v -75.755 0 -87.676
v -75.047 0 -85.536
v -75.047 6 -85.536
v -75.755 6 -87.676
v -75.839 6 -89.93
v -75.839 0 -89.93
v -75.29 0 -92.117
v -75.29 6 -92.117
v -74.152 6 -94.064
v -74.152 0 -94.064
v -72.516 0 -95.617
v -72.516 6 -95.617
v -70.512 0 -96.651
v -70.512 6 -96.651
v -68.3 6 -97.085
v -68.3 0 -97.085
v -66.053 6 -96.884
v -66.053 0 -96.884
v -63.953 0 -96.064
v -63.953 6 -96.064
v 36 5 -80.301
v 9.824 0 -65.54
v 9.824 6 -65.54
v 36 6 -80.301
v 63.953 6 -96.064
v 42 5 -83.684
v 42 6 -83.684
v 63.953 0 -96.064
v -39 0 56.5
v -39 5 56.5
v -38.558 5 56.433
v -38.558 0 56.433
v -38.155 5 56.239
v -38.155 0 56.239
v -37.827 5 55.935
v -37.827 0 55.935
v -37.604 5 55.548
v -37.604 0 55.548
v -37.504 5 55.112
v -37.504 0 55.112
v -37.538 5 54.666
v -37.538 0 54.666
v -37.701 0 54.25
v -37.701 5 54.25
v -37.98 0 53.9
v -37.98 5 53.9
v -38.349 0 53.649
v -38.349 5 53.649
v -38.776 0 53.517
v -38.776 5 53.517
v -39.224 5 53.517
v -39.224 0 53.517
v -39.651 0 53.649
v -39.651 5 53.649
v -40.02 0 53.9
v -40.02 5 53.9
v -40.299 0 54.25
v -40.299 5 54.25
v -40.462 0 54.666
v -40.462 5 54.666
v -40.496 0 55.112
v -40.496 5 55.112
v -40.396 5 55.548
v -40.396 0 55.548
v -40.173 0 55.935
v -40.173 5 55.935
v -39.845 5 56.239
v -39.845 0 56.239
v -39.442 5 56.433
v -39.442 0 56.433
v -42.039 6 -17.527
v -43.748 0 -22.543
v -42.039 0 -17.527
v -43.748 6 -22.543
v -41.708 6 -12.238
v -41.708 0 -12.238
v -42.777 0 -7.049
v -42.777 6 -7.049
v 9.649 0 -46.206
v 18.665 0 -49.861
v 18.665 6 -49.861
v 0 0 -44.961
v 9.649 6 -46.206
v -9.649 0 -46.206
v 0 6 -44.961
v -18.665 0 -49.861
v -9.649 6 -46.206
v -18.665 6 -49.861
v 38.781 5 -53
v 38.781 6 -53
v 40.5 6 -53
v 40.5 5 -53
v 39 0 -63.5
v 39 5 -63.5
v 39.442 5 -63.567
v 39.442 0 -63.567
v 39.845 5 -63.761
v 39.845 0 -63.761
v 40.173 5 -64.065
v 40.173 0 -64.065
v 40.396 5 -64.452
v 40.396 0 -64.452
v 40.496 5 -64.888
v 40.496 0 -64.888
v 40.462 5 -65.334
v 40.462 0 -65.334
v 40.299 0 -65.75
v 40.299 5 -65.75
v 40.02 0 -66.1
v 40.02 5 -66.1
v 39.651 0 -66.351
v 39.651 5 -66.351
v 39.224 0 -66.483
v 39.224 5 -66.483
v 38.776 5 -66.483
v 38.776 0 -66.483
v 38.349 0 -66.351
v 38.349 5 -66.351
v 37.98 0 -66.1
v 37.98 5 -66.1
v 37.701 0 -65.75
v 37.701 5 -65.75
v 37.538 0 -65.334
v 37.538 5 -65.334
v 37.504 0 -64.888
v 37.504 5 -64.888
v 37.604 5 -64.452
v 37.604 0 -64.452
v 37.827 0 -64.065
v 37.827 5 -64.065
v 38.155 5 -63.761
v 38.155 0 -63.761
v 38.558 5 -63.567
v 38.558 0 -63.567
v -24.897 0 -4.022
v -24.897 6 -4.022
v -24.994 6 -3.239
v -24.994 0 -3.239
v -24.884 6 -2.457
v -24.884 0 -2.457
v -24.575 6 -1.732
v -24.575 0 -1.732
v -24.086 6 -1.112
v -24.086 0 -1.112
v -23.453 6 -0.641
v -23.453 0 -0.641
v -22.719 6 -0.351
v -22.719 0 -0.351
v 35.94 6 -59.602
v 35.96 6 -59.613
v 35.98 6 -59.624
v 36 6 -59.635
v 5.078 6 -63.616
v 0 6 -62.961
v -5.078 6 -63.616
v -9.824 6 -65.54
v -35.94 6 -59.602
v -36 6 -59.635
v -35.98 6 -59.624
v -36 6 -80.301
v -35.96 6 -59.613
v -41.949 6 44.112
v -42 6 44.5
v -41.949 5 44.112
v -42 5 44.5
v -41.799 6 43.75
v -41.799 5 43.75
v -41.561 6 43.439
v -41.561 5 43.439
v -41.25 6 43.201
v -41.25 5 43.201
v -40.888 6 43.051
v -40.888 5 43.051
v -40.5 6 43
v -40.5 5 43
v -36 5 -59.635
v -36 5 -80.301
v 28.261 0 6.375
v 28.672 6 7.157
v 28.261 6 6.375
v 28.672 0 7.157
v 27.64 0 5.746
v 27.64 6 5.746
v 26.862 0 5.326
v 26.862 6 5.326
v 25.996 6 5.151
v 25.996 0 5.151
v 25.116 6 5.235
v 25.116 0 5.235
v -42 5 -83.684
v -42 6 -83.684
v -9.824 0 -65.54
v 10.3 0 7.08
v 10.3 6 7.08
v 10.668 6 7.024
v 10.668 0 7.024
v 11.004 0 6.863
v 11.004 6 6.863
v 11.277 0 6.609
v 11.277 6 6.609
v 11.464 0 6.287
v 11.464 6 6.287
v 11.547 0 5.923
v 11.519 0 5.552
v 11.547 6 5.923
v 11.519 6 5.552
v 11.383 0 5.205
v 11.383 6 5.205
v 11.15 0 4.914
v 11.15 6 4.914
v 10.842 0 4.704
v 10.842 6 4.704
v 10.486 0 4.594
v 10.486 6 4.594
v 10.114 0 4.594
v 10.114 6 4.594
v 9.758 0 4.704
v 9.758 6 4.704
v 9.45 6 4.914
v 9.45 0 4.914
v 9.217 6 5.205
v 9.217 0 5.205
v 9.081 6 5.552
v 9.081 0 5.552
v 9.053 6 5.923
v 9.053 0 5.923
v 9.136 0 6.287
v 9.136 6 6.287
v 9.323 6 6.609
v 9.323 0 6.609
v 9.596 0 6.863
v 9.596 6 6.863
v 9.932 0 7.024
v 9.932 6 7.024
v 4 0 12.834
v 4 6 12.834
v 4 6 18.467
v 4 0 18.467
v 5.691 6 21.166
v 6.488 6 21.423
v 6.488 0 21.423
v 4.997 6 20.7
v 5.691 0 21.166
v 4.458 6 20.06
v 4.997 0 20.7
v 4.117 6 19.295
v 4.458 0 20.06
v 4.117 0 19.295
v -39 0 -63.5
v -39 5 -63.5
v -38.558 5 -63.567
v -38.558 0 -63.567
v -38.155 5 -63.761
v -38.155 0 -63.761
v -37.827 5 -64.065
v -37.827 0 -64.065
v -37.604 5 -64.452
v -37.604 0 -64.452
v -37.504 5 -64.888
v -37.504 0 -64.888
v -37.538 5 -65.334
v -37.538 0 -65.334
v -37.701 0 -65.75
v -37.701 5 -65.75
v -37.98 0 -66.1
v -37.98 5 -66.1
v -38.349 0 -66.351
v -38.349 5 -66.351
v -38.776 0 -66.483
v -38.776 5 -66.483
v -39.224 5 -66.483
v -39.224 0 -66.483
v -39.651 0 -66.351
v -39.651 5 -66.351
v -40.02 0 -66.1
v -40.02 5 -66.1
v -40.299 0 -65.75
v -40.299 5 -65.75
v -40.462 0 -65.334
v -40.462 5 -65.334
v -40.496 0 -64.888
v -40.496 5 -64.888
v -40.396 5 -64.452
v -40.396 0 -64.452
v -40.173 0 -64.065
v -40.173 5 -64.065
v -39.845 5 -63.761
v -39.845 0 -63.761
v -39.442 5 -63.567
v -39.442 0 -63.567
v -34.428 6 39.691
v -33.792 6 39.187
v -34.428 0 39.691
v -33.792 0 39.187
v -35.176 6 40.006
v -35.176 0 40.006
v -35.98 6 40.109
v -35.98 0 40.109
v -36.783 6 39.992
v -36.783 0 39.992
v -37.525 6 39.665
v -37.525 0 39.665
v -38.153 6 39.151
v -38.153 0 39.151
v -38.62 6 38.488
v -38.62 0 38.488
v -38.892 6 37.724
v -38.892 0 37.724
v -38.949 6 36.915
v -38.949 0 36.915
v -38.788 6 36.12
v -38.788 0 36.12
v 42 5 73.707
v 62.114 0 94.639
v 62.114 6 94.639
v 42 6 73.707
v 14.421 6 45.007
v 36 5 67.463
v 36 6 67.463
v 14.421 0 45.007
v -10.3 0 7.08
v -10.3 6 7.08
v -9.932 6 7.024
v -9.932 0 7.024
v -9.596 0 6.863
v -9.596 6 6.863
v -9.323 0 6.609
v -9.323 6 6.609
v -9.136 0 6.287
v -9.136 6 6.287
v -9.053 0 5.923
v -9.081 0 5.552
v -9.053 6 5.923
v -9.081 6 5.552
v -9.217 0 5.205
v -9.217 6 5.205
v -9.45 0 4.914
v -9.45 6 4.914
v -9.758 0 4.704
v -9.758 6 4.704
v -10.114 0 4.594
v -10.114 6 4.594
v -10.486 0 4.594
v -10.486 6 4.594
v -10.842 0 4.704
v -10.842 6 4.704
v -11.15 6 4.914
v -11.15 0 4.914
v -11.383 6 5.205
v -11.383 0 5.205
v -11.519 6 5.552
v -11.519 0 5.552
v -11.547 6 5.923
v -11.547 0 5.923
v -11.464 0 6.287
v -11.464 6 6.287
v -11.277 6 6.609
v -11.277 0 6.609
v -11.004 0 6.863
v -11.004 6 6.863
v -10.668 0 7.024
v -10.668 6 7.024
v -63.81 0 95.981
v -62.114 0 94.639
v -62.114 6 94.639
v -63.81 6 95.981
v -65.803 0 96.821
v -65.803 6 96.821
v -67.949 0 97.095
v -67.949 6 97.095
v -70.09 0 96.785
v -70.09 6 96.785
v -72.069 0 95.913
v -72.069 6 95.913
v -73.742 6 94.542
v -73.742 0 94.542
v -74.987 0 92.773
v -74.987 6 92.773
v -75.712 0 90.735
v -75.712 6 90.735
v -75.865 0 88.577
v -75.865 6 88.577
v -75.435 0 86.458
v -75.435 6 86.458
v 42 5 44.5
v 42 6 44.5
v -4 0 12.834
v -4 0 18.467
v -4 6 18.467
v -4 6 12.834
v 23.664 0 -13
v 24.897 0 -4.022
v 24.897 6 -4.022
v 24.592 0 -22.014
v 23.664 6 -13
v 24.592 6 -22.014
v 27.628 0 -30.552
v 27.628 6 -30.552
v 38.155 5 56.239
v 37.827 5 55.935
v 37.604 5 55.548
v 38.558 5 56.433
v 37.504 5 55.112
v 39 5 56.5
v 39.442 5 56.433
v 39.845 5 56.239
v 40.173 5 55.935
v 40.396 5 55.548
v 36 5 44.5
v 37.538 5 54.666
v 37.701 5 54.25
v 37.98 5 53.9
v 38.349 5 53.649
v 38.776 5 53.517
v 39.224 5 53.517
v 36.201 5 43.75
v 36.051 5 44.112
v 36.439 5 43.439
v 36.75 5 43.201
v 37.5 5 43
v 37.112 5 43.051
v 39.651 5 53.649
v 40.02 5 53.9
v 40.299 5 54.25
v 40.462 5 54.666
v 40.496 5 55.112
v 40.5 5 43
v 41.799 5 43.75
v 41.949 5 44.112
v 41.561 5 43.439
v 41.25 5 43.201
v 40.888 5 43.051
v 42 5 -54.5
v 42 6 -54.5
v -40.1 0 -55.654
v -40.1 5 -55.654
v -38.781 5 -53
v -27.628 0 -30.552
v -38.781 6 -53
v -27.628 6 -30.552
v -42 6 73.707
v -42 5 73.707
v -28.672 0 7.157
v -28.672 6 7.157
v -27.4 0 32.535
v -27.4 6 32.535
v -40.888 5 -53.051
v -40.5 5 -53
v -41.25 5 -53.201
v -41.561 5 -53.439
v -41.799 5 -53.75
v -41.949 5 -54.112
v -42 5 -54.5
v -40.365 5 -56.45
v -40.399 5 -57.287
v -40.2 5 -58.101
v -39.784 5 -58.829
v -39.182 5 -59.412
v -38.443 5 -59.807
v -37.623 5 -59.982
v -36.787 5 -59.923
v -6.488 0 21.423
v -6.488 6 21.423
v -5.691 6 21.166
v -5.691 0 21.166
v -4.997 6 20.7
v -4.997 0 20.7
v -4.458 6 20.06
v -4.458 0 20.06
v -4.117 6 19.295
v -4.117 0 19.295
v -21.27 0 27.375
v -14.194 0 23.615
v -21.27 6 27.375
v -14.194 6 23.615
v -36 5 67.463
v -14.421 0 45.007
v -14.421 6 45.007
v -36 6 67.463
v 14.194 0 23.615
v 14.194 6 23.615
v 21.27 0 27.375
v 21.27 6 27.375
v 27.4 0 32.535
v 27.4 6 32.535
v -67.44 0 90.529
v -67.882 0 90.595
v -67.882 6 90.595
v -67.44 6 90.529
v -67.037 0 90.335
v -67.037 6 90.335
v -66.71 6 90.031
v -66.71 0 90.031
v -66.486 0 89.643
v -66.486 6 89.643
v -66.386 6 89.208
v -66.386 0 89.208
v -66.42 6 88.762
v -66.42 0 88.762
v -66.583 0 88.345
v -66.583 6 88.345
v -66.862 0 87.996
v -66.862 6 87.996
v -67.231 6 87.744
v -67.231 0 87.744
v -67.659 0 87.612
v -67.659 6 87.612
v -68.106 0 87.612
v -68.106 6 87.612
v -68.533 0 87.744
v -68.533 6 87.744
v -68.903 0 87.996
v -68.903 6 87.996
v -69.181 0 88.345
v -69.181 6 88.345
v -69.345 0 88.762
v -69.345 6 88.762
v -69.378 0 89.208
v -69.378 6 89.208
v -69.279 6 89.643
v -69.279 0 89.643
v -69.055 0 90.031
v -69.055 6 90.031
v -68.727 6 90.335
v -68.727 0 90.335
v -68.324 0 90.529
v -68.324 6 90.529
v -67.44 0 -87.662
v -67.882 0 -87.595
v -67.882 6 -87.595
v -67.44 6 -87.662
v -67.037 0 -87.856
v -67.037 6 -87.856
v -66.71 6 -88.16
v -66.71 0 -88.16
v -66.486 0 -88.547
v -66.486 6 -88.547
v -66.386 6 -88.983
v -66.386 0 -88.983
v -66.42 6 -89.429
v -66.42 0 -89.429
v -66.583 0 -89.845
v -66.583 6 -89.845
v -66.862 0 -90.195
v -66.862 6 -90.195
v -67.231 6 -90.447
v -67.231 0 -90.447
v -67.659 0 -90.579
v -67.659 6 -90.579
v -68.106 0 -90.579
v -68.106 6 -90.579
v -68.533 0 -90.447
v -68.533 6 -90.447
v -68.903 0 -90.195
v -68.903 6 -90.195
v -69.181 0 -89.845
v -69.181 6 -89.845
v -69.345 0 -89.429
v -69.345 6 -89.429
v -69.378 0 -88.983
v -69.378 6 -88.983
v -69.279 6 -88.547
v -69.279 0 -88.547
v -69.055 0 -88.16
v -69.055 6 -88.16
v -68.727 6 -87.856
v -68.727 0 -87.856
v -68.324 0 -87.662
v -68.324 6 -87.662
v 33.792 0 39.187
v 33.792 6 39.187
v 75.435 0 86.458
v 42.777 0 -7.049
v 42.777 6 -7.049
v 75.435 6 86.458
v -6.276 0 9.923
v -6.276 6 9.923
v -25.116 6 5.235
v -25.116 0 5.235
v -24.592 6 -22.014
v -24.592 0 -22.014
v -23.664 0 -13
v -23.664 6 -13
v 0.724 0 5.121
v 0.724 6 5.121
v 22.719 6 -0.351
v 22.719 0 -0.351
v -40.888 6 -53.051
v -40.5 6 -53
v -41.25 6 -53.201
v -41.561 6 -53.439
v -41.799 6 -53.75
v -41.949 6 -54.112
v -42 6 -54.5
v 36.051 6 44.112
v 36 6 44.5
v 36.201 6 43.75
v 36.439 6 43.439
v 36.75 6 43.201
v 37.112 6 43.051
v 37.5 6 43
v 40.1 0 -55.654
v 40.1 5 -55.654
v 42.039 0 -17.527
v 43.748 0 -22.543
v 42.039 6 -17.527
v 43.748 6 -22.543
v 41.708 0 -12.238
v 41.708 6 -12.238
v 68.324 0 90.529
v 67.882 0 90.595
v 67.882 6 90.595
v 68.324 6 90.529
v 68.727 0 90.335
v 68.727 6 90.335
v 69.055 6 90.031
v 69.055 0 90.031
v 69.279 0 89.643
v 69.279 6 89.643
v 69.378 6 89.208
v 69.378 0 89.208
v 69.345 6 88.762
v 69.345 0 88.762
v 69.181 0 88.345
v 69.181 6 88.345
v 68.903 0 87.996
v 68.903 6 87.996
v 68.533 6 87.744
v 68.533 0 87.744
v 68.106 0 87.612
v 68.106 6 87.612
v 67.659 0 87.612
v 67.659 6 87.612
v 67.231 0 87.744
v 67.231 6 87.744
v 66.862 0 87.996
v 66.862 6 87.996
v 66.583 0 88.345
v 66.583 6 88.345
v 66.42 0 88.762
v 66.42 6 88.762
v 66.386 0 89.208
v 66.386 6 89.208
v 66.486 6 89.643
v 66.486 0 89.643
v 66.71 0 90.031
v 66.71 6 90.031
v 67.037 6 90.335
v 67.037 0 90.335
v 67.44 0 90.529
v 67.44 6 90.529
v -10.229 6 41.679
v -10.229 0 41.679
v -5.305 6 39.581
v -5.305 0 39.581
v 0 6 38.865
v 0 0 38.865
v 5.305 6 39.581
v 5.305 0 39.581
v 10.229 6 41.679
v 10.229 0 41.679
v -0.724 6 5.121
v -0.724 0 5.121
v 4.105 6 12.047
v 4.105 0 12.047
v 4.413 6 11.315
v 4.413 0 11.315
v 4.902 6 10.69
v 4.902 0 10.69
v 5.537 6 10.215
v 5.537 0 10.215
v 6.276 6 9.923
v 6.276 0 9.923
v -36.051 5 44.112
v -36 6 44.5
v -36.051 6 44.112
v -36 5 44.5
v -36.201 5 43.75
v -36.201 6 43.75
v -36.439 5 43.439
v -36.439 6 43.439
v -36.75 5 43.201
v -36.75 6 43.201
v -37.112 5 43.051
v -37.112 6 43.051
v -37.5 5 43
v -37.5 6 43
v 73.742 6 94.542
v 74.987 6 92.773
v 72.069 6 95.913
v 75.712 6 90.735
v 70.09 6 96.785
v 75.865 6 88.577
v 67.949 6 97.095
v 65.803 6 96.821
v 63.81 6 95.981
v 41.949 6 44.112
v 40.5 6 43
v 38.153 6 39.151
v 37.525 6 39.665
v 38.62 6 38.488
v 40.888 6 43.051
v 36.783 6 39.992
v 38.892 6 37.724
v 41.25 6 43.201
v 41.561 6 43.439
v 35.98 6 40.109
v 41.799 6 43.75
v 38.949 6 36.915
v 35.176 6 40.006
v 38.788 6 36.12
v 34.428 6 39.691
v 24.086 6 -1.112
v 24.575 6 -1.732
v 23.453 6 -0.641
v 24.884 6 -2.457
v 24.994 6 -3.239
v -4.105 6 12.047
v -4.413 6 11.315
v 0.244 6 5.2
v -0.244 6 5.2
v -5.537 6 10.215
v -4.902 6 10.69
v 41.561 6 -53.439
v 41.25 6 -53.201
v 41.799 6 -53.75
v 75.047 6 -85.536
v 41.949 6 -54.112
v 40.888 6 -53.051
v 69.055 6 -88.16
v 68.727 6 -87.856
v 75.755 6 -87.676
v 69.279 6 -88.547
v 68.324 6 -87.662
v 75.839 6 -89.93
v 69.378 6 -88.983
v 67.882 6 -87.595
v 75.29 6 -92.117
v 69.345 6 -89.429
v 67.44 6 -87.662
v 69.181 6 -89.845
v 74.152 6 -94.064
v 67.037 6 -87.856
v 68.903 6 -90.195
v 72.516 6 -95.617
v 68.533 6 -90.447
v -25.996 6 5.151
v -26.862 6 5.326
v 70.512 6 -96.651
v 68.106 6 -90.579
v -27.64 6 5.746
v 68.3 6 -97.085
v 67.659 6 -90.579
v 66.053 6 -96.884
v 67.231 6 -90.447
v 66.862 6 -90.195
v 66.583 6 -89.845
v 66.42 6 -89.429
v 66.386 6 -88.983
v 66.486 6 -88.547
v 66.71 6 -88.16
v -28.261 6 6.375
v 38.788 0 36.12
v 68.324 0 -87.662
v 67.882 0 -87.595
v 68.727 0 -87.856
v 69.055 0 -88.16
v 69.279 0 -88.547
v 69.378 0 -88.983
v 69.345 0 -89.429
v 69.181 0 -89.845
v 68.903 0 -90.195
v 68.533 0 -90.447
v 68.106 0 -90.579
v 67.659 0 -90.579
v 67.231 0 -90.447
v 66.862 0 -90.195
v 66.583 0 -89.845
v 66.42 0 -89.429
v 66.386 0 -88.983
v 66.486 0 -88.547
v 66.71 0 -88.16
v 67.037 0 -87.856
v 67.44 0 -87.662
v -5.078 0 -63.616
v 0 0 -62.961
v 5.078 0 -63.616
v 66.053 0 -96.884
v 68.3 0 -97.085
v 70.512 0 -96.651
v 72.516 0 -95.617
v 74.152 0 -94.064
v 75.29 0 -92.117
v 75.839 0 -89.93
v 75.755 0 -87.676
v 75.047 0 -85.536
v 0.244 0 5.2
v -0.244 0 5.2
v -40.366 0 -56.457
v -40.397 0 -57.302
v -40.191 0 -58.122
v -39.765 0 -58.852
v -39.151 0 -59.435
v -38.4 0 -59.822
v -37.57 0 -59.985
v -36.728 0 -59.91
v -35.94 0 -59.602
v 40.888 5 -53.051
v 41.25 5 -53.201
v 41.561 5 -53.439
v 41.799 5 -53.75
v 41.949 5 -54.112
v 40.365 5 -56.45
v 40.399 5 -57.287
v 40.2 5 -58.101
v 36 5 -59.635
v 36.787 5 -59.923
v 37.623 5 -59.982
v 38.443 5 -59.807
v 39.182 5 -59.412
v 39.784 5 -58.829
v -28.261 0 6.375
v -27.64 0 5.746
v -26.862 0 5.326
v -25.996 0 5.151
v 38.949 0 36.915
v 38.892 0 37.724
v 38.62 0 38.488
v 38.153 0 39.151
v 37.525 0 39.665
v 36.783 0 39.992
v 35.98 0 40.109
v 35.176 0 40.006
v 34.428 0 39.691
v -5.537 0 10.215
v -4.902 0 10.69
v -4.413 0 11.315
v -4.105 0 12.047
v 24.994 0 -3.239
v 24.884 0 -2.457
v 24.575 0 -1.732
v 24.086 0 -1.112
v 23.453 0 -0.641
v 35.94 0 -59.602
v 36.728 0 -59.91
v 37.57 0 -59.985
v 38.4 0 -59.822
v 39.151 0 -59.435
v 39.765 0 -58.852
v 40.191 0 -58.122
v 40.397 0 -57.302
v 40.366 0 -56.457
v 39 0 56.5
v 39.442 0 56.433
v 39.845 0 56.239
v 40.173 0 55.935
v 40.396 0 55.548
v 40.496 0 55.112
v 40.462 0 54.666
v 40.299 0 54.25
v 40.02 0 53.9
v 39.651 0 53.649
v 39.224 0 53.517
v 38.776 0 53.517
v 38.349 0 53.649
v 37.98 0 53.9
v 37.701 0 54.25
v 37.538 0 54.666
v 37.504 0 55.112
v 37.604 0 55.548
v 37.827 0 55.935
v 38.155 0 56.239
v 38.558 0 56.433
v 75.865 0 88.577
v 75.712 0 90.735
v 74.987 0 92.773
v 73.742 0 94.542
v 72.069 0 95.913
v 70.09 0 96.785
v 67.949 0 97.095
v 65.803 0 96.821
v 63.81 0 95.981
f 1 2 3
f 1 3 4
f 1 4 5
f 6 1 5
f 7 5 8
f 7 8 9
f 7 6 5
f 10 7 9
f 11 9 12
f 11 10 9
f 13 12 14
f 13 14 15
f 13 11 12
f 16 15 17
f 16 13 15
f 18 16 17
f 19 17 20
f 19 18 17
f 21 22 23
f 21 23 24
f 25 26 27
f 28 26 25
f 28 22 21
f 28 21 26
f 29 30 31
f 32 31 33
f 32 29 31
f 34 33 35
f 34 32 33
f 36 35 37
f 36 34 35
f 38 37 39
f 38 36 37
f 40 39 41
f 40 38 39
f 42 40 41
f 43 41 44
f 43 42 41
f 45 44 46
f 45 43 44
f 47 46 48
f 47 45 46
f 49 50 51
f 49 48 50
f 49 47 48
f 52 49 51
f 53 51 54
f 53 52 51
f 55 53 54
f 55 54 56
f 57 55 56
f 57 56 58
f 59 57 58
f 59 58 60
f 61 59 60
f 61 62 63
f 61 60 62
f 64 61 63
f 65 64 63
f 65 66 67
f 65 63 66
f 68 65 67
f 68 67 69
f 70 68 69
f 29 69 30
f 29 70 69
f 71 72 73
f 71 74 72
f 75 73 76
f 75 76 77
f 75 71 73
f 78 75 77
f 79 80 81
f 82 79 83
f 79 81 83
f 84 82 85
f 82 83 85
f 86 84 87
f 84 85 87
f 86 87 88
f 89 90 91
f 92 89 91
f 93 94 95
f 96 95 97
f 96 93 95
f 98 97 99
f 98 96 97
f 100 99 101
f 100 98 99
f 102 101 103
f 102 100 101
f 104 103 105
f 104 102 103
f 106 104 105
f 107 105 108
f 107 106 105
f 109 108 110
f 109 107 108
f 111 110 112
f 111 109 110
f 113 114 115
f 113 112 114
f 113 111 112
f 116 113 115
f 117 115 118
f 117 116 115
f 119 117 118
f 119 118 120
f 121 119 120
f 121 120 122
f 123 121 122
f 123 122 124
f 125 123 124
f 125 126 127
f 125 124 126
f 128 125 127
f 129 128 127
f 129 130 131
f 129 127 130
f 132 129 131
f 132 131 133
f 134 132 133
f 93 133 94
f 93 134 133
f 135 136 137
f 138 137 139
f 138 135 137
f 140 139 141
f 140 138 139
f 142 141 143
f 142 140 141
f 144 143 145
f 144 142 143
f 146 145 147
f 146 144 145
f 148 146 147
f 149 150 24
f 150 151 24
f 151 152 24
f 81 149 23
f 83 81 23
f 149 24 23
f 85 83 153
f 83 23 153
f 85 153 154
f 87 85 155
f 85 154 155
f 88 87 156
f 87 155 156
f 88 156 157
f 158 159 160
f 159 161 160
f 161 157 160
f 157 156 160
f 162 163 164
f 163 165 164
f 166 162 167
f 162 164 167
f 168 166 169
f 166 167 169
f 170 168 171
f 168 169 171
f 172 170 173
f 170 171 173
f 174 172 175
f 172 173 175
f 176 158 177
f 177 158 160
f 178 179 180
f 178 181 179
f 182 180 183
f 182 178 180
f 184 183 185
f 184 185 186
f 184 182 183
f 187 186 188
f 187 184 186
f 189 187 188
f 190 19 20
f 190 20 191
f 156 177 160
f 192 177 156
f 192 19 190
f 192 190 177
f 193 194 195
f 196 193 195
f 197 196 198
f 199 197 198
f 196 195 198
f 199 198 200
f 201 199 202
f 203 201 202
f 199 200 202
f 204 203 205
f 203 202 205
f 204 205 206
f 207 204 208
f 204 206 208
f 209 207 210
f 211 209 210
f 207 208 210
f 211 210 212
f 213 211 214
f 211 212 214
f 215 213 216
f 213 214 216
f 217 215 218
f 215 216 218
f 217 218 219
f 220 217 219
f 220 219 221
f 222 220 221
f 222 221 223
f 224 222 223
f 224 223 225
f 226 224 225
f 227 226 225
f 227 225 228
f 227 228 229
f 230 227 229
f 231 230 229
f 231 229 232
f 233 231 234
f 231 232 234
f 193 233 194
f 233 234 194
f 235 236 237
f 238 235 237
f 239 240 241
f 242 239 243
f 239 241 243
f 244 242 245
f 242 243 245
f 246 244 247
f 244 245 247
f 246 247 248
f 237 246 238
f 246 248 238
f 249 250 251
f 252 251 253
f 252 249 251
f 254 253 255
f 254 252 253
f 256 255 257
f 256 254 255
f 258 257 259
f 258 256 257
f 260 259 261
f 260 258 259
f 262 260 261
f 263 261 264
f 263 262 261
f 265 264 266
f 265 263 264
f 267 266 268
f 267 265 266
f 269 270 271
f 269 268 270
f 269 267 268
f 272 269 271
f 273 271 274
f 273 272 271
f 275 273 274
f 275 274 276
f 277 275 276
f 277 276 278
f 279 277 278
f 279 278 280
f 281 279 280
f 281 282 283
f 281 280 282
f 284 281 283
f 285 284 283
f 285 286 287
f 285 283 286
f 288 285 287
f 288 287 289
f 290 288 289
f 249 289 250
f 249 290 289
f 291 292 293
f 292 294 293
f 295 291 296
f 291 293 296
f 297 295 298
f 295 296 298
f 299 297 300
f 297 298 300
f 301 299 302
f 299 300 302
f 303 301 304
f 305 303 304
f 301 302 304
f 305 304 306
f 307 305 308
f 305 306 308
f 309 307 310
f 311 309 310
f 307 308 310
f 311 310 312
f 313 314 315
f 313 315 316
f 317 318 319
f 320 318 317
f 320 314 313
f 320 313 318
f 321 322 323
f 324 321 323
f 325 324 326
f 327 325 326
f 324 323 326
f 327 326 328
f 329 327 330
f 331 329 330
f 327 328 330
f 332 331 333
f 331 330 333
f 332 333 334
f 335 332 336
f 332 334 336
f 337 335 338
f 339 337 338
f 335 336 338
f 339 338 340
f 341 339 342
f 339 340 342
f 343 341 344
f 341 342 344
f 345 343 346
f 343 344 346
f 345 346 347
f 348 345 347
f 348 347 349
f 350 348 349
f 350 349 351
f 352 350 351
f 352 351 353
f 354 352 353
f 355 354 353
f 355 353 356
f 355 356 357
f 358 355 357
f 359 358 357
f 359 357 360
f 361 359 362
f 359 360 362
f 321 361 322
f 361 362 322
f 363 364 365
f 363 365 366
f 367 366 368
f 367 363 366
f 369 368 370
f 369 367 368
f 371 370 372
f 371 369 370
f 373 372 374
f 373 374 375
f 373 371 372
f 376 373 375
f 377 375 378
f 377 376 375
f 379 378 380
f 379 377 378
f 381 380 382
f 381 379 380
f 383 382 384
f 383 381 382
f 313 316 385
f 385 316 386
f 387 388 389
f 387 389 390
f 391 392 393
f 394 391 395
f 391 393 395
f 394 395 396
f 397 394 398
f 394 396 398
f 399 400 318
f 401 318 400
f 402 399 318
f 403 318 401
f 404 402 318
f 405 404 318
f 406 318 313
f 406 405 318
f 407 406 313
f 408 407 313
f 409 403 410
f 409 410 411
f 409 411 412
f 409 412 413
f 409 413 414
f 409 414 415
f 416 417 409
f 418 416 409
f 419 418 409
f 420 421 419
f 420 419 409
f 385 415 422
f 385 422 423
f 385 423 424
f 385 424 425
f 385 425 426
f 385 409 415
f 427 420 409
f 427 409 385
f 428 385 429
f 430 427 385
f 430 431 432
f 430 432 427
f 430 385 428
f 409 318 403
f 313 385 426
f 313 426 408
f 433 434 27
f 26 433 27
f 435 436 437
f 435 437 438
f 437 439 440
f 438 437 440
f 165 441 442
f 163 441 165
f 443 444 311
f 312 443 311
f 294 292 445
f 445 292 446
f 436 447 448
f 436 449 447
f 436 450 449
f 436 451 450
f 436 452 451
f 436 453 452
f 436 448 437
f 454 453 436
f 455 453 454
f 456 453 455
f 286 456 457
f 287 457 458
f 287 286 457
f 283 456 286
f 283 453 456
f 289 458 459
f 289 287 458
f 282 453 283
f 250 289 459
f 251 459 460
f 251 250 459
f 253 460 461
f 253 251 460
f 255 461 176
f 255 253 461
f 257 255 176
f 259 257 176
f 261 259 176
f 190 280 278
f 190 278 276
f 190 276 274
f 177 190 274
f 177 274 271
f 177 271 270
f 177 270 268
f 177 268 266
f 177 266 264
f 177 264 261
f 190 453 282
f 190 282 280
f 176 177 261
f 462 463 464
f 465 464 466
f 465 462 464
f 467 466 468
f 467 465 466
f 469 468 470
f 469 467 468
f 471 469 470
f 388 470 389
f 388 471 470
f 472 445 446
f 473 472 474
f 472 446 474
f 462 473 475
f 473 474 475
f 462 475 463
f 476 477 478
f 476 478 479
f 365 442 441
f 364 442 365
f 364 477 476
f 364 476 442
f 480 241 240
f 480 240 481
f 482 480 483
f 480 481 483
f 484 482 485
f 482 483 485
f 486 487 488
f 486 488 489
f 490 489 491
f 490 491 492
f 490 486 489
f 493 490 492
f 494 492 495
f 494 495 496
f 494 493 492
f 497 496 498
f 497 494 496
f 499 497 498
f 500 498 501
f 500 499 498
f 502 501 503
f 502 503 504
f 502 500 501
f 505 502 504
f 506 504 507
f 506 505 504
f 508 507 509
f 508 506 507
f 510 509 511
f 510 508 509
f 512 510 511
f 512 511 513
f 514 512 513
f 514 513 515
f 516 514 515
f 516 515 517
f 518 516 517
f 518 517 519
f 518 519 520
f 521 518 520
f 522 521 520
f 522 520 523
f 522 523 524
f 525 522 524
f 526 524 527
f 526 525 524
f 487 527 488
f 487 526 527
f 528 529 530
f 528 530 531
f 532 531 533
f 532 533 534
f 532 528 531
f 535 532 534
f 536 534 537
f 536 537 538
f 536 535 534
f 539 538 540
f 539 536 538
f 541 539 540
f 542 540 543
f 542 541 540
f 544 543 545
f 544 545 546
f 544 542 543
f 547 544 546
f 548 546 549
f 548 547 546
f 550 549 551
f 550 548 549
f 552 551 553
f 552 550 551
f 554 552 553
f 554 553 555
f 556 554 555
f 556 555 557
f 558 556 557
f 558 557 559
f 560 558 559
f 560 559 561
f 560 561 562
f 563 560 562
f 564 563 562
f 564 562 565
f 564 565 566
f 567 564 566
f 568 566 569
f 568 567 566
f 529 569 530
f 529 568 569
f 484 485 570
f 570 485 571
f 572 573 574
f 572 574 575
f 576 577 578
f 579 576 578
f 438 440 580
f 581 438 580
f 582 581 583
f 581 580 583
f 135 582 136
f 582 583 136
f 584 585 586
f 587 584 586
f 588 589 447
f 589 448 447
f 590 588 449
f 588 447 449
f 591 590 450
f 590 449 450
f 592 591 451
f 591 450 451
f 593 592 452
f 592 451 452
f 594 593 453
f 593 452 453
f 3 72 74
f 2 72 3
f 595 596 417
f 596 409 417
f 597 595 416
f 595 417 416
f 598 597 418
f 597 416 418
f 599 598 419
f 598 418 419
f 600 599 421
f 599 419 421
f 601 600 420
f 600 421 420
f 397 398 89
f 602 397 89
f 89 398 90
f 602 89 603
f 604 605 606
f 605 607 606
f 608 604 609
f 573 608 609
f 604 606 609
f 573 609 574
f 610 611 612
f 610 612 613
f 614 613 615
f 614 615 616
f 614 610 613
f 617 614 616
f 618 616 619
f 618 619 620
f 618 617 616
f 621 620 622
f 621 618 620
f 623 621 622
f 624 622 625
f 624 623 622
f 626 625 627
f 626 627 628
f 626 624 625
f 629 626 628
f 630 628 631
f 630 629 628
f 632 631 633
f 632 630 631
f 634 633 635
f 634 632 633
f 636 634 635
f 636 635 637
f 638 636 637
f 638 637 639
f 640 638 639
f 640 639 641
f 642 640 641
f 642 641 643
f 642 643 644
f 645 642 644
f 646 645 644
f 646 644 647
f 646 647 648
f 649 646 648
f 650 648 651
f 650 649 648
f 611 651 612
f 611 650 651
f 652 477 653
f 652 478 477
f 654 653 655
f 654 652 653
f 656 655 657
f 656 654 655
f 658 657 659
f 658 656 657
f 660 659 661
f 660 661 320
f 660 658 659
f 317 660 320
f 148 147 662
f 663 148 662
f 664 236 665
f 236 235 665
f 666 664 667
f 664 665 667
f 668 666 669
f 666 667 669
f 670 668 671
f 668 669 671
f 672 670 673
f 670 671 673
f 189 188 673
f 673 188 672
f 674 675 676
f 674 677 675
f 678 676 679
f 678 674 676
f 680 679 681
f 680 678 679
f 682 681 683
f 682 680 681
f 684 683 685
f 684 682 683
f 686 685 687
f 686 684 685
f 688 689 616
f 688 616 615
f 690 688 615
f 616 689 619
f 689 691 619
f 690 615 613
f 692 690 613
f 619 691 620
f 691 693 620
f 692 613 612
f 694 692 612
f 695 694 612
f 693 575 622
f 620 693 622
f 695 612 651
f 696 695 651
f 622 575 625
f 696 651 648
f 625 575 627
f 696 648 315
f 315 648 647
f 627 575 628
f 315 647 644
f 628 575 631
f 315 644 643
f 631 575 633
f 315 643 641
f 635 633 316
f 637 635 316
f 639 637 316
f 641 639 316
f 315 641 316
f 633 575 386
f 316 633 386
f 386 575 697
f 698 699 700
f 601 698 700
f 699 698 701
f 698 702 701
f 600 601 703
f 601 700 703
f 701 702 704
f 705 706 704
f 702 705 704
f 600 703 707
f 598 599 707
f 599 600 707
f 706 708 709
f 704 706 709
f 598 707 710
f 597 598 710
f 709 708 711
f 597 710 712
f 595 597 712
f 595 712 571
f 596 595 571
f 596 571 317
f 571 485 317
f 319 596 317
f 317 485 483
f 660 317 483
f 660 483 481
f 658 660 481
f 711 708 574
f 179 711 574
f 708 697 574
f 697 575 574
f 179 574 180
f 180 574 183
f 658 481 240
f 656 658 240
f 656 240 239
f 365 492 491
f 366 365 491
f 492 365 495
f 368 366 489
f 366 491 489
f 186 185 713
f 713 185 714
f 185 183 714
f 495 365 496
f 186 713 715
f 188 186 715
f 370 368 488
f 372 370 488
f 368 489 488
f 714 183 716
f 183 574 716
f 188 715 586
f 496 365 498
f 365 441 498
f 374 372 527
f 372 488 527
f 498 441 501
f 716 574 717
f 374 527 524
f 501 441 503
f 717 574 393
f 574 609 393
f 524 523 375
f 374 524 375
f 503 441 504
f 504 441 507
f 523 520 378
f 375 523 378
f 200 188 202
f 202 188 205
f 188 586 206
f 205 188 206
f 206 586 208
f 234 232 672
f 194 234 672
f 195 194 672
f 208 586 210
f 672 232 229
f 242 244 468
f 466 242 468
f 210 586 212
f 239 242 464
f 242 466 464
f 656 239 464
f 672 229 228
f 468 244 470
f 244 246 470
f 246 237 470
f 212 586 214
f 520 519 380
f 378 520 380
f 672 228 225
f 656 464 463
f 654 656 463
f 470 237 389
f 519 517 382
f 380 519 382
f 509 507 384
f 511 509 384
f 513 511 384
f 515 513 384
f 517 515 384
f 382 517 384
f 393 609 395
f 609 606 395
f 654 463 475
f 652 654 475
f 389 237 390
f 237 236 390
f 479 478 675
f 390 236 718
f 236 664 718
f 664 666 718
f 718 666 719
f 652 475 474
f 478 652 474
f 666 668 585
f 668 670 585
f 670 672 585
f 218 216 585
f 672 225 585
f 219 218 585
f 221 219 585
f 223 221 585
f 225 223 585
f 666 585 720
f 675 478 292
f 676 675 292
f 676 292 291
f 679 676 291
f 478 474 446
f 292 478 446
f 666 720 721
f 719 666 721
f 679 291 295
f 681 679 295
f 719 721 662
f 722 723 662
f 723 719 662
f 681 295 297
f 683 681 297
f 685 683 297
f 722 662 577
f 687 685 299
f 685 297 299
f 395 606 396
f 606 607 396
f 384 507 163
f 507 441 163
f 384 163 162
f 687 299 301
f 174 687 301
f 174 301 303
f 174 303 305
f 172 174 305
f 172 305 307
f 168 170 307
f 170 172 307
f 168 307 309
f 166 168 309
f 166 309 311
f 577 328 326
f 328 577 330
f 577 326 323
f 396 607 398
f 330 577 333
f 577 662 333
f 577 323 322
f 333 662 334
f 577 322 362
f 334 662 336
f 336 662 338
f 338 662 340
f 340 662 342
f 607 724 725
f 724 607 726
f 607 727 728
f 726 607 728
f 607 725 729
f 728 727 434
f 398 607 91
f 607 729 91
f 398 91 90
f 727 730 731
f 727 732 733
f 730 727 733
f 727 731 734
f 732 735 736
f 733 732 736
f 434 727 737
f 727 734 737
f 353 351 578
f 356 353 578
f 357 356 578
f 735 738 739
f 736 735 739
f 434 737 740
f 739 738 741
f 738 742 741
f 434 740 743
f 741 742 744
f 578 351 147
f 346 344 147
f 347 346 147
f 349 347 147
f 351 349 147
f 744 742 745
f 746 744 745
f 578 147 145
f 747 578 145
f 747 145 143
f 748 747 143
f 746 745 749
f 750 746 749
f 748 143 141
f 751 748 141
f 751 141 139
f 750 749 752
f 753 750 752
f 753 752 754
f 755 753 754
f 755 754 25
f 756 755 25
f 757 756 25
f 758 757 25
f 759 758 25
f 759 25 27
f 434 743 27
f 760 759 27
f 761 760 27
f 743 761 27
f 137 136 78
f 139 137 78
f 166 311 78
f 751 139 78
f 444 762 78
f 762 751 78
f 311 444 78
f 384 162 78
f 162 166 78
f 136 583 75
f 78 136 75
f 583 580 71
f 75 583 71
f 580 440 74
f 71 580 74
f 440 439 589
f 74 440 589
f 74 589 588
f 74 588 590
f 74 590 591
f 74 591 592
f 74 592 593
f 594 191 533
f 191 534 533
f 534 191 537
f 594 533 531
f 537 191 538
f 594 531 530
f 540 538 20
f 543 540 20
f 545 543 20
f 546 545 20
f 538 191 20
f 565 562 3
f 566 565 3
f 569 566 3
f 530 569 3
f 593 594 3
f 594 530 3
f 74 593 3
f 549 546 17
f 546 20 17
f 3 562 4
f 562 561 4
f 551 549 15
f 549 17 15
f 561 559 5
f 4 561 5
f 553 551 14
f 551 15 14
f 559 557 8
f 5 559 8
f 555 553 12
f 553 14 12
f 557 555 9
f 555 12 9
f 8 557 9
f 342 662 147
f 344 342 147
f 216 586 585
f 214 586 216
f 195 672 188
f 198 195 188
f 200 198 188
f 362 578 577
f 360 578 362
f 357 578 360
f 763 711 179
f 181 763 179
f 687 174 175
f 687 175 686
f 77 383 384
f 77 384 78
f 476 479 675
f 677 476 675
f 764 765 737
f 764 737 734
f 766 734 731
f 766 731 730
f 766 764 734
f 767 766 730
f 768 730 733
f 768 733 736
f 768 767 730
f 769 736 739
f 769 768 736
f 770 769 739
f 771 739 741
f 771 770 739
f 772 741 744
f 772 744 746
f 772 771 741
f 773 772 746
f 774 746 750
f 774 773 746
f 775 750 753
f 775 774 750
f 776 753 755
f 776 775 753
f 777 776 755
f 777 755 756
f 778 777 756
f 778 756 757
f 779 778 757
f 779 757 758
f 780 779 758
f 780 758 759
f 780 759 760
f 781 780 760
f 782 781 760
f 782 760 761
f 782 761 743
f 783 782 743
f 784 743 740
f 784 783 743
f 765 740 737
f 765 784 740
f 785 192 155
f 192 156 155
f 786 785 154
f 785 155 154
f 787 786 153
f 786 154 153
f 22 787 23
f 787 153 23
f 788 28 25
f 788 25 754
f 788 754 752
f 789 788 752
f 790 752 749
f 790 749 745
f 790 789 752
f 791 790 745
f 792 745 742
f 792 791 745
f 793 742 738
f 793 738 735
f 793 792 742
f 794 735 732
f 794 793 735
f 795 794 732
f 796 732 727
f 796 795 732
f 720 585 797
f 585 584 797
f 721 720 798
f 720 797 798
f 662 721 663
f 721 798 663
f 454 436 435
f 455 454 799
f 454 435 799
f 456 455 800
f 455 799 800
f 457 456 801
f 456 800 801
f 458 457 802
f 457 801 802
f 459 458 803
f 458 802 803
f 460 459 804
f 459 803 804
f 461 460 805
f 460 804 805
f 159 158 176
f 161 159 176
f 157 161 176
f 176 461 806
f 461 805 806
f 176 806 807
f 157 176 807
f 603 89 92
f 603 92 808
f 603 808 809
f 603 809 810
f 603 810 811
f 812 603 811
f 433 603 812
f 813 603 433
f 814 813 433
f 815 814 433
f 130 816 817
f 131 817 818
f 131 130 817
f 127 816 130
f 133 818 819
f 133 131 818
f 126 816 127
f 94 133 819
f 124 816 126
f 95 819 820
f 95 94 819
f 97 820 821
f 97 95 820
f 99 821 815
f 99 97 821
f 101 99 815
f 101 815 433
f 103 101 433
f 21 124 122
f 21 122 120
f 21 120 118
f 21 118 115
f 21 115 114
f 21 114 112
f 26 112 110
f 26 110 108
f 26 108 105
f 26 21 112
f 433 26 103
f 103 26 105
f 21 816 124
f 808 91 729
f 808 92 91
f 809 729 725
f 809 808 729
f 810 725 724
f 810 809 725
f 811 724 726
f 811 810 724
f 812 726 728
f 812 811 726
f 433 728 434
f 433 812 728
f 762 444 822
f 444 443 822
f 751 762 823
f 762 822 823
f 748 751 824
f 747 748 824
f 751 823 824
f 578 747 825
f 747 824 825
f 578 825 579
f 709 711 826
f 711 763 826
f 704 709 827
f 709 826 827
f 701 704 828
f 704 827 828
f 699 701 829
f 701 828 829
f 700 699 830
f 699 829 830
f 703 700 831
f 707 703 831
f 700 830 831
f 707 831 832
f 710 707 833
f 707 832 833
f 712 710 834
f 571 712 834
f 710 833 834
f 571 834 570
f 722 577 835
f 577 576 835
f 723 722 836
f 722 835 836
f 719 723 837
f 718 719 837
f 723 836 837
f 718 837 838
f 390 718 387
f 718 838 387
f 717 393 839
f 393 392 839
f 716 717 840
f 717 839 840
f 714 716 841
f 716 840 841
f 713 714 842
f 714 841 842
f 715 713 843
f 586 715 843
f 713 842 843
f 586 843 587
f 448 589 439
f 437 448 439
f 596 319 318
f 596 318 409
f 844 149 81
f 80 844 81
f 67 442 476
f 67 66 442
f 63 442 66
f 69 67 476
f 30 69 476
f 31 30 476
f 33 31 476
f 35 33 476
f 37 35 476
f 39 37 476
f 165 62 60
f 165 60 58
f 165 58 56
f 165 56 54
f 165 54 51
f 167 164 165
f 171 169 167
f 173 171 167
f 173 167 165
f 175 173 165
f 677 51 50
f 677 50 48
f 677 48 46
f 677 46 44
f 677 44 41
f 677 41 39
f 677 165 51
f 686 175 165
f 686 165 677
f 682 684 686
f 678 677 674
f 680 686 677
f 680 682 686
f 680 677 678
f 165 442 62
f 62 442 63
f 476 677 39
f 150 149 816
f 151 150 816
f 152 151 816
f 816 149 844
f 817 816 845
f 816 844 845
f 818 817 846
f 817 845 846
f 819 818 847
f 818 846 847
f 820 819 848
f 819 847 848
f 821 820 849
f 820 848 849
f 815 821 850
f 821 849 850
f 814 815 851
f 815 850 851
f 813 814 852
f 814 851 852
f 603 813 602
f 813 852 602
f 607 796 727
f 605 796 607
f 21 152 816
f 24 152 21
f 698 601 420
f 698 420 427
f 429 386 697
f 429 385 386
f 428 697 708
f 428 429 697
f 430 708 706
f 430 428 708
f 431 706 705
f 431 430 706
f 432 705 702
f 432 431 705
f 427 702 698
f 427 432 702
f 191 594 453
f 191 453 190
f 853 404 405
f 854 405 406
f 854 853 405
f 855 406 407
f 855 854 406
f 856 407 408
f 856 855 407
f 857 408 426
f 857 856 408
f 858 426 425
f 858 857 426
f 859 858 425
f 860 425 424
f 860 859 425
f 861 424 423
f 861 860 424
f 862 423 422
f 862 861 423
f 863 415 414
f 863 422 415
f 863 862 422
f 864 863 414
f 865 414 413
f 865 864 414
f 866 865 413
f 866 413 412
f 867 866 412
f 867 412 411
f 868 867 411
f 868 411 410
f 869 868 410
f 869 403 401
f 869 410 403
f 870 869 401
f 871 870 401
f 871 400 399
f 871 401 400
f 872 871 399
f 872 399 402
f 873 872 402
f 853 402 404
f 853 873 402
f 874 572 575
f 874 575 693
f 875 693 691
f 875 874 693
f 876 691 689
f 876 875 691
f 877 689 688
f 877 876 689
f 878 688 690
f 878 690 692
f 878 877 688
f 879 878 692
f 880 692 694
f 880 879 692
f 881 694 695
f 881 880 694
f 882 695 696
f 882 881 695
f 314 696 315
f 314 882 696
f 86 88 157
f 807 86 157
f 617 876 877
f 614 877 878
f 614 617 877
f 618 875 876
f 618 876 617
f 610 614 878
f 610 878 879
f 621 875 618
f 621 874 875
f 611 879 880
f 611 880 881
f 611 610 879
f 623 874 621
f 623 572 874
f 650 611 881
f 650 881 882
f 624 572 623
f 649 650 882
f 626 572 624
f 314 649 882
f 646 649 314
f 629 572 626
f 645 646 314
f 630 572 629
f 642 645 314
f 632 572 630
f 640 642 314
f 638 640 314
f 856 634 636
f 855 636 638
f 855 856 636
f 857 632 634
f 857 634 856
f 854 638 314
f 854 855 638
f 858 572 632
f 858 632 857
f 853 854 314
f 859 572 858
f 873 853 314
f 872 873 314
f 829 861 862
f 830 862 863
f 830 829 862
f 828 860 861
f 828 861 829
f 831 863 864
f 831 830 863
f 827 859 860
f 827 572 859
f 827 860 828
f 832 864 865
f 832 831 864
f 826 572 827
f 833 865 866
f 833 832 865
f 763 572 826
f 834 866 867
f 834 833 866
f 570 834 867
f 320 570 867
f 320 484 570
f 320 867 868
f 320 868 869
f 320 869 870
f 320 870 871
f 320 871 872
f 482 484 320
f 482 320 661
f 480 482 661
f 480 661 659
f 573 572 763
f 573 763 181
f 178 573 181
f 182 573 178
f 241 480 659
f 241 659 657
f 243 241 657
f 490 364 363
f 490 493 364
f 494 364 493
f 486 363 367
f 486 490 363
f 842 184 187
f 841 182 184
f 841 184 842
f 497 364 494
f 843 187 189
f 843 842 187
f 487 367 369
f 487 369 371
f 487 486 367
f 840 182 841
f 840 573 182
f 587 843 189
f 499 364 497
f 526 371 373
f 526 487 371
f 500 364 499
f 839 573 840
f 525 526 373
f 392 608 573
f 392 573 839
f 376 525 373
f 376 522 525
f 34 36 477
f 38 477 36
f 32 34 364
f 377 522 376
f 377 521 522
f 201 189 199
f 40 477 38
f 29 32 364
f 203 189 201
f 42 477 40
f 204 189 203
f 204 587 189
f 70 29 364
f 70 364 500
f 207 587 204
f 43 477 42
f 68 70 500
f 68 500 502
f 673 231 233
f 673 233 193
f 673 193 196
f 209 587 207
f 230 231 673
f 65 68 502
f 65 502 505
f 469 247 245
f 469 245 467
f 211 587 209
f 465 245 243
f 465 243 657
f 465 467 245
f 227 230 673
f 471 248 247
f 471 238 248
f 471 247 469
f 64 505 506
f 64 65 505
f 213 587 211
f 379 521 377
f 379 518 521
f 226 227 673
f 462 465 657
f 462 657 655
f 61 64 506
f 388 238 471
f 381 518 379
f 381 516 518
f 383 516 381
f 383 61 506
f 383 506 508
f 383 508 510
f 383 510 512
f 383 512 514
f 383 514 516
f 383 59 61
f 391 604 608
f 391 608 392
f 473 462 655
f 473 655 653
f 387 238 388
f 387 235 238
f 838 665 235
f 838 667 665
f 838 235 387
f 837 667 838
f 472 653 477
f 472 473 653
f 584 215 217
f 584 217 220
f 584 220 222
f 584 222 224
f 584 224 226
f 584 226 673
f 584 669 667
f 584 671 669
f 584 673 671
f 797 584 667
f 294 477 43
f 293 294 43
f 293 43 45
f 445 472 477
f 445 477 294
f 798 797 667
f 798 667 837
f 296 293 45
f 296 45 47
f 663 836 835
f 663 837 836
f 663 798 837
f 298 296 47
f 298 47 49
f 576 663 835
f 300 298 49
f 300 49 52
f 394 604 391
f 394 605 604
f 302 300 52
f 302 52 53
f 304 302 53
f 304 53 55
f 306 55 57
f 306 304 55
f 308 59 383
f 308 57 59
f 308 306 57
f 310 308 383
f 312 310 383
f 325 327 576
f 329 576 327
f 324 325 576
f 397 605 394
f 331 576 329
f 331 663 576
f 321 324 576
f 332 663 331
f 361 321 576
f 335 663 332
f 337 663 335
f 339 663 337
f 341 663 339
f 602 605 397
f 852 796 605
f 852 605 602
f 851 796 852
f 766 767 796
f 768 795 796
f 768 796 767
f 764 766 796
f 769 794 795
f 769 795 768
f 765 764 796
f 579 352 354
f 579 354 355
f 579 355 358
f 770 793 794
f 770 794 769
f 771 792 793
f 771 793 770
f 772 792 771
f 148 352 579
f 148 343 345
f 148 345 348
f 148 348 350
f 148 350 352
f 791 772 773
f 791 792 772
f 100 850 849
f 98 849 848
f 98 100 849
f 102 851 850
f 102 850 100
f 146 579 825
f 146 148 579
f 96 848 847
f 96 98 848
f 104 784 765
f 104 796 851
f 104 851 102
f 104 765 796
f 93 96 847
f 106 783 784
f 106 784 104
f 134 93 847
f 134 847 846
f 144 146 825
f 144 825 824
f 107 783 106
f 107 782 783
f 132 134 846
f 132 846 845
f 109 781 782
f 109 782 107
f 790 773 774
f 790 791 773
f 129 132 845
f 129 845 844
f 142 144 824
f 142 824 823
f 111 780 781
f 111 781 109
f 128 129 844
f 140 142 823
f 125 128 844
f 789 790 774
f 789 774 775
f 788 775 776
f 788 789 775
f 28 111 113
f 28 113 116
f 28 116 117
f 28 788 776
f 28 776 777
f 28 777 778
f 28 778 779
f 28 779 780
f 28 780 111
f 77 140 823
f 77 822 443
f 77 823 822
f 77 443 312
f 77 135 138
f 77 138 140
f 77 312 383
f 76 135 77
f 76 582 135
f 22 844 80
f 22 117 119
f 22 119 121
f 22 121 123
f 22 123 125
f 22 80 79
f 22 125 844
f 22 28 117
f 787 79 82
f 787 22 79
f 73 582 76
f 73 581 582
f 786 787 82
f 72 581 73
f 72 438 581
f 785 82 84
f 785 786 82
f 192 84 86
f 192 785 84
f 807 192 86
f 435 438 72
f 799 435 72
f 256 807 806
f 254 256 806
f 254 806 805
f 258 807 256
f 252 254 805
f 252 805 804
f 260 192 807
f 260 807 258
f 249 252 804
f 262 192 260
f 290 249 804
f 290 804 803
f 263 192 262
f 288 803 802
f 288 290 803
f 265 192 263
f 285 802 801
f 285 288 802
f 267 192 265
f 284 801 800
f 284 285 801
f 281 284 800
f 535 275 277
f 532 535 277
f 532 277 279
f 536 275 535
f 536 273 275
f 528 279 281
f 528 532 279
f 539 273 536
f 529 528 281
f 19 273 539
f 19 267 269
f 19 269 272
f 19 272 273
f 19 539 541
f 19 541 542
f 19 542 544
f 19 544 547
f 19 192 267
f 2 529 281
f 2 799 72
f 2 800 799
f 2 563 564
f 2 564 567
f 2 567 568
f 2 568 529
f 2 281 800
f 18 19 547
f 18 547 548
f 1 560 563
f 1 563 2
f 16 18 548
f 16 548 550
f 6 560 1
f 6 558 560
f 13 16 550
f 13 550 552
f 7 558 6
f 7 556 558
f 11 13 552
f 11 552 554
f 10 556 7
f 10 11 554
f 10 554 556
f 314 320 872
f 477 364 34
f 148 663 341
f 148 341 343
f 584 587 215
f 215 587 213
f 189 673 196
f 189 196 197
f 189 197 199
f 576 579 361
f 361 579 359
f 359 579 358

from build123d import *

# Parameters (mm, degrees)
SKETCH1_R           = 1.5
BOSS_EXTRUDE1_DEPTH = 6
FILLET1_R           = 20
CUT_EXTRUDE1_REACH  = 125.376
SKETCH5_R           = 1.25
BOSS_EXTRUDE2_DEPTH = 6
FILLET2_R           = 3
SKETCH6_W           = 6
SKETCH6_H           = 30.707123962
SKETCH6_H_2         = 30.684410161
CUT_EXTRUDE2_DEPTH  = 1
FILLET3_R           = 1.5


with BuildPart() as part:
    # Sketch1 → Boss-Extrude1 (new body)
    with BuildSketch(Plane(origin=(0, 0, 0), x_dir=(1, 0, 0), z_dir=(0, 1, 0))):
        with BuildLine():
            Line((-63.952675545, 96.063842822), (0, 60))
            Line((0, 60), (63.952675545, 96.063842822))
            ThreePointArc((63.952675545, 96.063842822), (73.389179934, 94.898361774), (75.046634262, 85.5357336))
            Line((75.046634262, 85.5357336), (40, 15))
            Line((40, 15), (75.434864258, -86.457646081))
            ThreePointArc((75.434864258, -86.457646081), (72.068849374, -95.912520808), (62.113867032, -94.638535384))
            Line((62.113867032, -94.638535384), (0, -30))
            Line((0, -30), (-62.113867032, -94.638535384))
            ThreePointArc((-62.113867032, -94.638535384), (-72.068849374, -95.912520808), (-75.434864258, -86.457646081))
            Line((-75.434864258, -86.457646081), (-40, 15))
            Line((-40, 15), (-75.046634262, 85.5357336))
            ThreePointArc((-75.046634262, 85.5357336), (-73.389179934, 94.898361774), (-63.952675545, 96.063842822))
        make_face()
        with Locations(Location((-67.882250994, 89.09545443, 0), (0, 0, 270))):
            Circle(SKETCH1_R, mode=Mode.SUBTRACT)
        with Locations(Location((67.882250994, 89.09545443, 0), (0, 0, 270))):
            Circle(SKETCH1_R, mode=Mode.SUBTRACT)
        with Locations(Location((-67.882250994, -89.09545443, 0), (0, 0, 270))):
            Circle(SKETCH1_R, mode=Mode.SUBTRACT)
        with Locations(Location((67.882250994, -89.09545443, 0), (0, 0, 270))):
            Circle(SKETCH1_R, mode=Mode.SUBTRACT)
        with Locations(Location((-39, 65, 0), (0, 0, 270))):
            Circle(SKETCH1_R, mode=Mode.SUBTRACT)
        with Locations(Location((39, 65, 0), (0, 0, 270))):
            Circle(SKETCH1_R, mode=Mode.SUBTRACT)
        with Locations(Location((39, -55, 0), (0, 0, 270))):
            Circle(SKETCH1_R, mode=Mode.SUBTRACT)
        with Locations(Location((-39, -55, 0), (0, 0, 270))):
            Circle(SKETCH1_R, mode=Mode.SUBTRACT)
    extrude(amount=BOSS_EXTRUDE1_DEPTH)

    # Fillet1
    fillet1_edges = [part.edges().sort_by_distance(p)[0] for p in [
        (0, 3, -60),
        (40, 3, -15),
        (0, 3, 30),
        (-40, 3, -15),
    ]]
    fillet(fillet1_edges, radius=FILLET1_R)

    # Sketch2 → Cut-Extrude1 (cut, up to next)
    with BuildSketch(Plane(origin=(0, 6, 0), x_dir=(1, 0, 0), z_dir=(0, 1, 0)), mode=Mode.PRIVATE) as cut_extrude1_sk1:
        with BuildLine():
            Line((-44.444795008, 64.398316163), (-27.62775586, 30.551922116))
            ThreePointArc((-27.62775586, 30.551922116), (-23.732915732, 16.019014171), (-25.78366338, 1.113658522))
            Line((-25.78366338, 1.113658522), (-43.323179503, -49.105752685))
            Line((-43.323179503, -49.105752685), (-27.39982382, -32.535179334))
            ThreePointArc((-27.39982382, -32.535179334), (0, -20.864813867), (27.39982382, -32.535179334))
            Line((27.39982382, -32.535179334), (43.323179503, -49.105752685))
            Line((43.323179503, -49.105752685), (25.78366338, 1.113658522))
            ThreePointArc((25.78366338, 1.113658522), (23.732915732, 16.019014171), (27.62775586, 30.551922116))
            Line((27.62775586, 30.551922116), (44.444795008, 64.398316163))
            Line((44.444795008, 64.398316163), (18.665483383, 49.860987824))
            ThreePointArc((18.665483383, 49.860987824), (0, 44.96083269), (-18.665483383, 49.860987824))
            Line((-18.665483383, 49.860987824), (-44.444795008, 64.398316163))
        make_face()
    cut_extrude1_tool1 = extrude(cut_extrude1_sk1.sketch, amount=-CUT_EXTRUDE1_REACH, mode=Mode.PRIVATE) & part.part
    add(cut_extrude1_tool1.solids().sort_by_distance((0, 6, -11.306472))[0], mode=Mode.SUBTRACT)

    # Sketch5 → Boss-Extrude2 (add)
    with BuildSketch(Plane(origin=(0, 6, 0), x_dir=(1, 0, 0), z_dir=(0, 1, 0))):
        with BuildLine():
            Line((-26.321862123, 1.247557887), (0, -5.301102183))
            Line((0, -5.301102183), (26.321862123, 1.247557887))
            Line((26.321862123, 1.247557887), (27.770453283, -4.57494876))
            Line((27.770453283, -4.57494876), (4, -10.488839561))
            Line((4, -10.488839561), (4, -21.075926612))
            ThreePointArc((4, -21.075926612), (0, -20.864813867), (-4, -21.075926612))
            Line((-4, -21.075926612), (-4, -10.488839561))
            Line((-4, -10.488839561), (-27.770453283, -4.57494876))
            Line((-27.770453283, -4.57494876), (-26.321862123, 1.247557887))
        make_face()
        with Locations(Location((-10.3, -5.83, 0), (0, 0, 270))):
            Circle(SKETCH5_R, mode=Mode.SUBTRACT)
        with Locations(Location((10.3, -5.83, 0), (0, 0, 270))):
            Circle(SKETCH5_R, mode=Mode.SUBTRACT)
    extrude(amount=-BOSS_EXTRUDE2_DEPTH)

    # Fillet2
    fillet2_edges = [part.edges().sort_by_distance(p)[0] for p in [
        (-44.444795008, 3, -64.398316163),
        (44.444795008, 3, -64.398316163),
        (25.78366338, 3, -1.113658522),
        (43.323179503, 3, 49.105752685),
        (-43.323179503, 3, 49.105752685),
        (-25.78366338, 3, -1.113658522),
        (0, 3, 5.301102183),
        (-4, 3, 10.488839561),
        (-4, 3, 21.075926612),
        (4, 3, 21.075926612),
        (4, 3, 10.488839561),
        (27.770453283, 3, 4.57494876),
        (-27.770453283, 3, 4.57494876),
    ]]
    fillet(fillet2_edges, radius=FILLET2_R)

    # Sketch6 → Cut-Extrude2 (cut)
    with BuildSketch(Plane(origin=(0, 6, 0), x_dir=(1, 0, 0), z_dir=(0, 1, 0))):
        with Locations((-39, -58.353561981)):
            Rectangle(SKETCH6_W, SKETCH6_H)
        with Locations((39, -58.353561981)):
            Rectangle(SKETCH6_W, SKETCH6_H)
        with Locations((39, 68.342205081)):
            Rectangle(SKETCH6_W, SKETCH6_H_2)
        with Locations((-39, 68.342205081)):
            Rectangle(SKETCH6_W, SKETCH6_H_2)
    extrude(amount=-CUT_EXTRUDE2_DEPTH, mode=Mode.SUBTRACT)

    # Fillet3
    fillet3_edges = [part.edges().sort_by_distance(p)[0] for p in [
        (-36, 5.5, 43),
        (-42, 5.5, 43),
        (36, 5.5, 43),
        (42, 5.5, 43),
        (42, 5.5, -53),
        (-42, 5.5, -53),
    ]]
    fillet(fillet3_edges, radius=FILLET3_R)


solid = part.part
